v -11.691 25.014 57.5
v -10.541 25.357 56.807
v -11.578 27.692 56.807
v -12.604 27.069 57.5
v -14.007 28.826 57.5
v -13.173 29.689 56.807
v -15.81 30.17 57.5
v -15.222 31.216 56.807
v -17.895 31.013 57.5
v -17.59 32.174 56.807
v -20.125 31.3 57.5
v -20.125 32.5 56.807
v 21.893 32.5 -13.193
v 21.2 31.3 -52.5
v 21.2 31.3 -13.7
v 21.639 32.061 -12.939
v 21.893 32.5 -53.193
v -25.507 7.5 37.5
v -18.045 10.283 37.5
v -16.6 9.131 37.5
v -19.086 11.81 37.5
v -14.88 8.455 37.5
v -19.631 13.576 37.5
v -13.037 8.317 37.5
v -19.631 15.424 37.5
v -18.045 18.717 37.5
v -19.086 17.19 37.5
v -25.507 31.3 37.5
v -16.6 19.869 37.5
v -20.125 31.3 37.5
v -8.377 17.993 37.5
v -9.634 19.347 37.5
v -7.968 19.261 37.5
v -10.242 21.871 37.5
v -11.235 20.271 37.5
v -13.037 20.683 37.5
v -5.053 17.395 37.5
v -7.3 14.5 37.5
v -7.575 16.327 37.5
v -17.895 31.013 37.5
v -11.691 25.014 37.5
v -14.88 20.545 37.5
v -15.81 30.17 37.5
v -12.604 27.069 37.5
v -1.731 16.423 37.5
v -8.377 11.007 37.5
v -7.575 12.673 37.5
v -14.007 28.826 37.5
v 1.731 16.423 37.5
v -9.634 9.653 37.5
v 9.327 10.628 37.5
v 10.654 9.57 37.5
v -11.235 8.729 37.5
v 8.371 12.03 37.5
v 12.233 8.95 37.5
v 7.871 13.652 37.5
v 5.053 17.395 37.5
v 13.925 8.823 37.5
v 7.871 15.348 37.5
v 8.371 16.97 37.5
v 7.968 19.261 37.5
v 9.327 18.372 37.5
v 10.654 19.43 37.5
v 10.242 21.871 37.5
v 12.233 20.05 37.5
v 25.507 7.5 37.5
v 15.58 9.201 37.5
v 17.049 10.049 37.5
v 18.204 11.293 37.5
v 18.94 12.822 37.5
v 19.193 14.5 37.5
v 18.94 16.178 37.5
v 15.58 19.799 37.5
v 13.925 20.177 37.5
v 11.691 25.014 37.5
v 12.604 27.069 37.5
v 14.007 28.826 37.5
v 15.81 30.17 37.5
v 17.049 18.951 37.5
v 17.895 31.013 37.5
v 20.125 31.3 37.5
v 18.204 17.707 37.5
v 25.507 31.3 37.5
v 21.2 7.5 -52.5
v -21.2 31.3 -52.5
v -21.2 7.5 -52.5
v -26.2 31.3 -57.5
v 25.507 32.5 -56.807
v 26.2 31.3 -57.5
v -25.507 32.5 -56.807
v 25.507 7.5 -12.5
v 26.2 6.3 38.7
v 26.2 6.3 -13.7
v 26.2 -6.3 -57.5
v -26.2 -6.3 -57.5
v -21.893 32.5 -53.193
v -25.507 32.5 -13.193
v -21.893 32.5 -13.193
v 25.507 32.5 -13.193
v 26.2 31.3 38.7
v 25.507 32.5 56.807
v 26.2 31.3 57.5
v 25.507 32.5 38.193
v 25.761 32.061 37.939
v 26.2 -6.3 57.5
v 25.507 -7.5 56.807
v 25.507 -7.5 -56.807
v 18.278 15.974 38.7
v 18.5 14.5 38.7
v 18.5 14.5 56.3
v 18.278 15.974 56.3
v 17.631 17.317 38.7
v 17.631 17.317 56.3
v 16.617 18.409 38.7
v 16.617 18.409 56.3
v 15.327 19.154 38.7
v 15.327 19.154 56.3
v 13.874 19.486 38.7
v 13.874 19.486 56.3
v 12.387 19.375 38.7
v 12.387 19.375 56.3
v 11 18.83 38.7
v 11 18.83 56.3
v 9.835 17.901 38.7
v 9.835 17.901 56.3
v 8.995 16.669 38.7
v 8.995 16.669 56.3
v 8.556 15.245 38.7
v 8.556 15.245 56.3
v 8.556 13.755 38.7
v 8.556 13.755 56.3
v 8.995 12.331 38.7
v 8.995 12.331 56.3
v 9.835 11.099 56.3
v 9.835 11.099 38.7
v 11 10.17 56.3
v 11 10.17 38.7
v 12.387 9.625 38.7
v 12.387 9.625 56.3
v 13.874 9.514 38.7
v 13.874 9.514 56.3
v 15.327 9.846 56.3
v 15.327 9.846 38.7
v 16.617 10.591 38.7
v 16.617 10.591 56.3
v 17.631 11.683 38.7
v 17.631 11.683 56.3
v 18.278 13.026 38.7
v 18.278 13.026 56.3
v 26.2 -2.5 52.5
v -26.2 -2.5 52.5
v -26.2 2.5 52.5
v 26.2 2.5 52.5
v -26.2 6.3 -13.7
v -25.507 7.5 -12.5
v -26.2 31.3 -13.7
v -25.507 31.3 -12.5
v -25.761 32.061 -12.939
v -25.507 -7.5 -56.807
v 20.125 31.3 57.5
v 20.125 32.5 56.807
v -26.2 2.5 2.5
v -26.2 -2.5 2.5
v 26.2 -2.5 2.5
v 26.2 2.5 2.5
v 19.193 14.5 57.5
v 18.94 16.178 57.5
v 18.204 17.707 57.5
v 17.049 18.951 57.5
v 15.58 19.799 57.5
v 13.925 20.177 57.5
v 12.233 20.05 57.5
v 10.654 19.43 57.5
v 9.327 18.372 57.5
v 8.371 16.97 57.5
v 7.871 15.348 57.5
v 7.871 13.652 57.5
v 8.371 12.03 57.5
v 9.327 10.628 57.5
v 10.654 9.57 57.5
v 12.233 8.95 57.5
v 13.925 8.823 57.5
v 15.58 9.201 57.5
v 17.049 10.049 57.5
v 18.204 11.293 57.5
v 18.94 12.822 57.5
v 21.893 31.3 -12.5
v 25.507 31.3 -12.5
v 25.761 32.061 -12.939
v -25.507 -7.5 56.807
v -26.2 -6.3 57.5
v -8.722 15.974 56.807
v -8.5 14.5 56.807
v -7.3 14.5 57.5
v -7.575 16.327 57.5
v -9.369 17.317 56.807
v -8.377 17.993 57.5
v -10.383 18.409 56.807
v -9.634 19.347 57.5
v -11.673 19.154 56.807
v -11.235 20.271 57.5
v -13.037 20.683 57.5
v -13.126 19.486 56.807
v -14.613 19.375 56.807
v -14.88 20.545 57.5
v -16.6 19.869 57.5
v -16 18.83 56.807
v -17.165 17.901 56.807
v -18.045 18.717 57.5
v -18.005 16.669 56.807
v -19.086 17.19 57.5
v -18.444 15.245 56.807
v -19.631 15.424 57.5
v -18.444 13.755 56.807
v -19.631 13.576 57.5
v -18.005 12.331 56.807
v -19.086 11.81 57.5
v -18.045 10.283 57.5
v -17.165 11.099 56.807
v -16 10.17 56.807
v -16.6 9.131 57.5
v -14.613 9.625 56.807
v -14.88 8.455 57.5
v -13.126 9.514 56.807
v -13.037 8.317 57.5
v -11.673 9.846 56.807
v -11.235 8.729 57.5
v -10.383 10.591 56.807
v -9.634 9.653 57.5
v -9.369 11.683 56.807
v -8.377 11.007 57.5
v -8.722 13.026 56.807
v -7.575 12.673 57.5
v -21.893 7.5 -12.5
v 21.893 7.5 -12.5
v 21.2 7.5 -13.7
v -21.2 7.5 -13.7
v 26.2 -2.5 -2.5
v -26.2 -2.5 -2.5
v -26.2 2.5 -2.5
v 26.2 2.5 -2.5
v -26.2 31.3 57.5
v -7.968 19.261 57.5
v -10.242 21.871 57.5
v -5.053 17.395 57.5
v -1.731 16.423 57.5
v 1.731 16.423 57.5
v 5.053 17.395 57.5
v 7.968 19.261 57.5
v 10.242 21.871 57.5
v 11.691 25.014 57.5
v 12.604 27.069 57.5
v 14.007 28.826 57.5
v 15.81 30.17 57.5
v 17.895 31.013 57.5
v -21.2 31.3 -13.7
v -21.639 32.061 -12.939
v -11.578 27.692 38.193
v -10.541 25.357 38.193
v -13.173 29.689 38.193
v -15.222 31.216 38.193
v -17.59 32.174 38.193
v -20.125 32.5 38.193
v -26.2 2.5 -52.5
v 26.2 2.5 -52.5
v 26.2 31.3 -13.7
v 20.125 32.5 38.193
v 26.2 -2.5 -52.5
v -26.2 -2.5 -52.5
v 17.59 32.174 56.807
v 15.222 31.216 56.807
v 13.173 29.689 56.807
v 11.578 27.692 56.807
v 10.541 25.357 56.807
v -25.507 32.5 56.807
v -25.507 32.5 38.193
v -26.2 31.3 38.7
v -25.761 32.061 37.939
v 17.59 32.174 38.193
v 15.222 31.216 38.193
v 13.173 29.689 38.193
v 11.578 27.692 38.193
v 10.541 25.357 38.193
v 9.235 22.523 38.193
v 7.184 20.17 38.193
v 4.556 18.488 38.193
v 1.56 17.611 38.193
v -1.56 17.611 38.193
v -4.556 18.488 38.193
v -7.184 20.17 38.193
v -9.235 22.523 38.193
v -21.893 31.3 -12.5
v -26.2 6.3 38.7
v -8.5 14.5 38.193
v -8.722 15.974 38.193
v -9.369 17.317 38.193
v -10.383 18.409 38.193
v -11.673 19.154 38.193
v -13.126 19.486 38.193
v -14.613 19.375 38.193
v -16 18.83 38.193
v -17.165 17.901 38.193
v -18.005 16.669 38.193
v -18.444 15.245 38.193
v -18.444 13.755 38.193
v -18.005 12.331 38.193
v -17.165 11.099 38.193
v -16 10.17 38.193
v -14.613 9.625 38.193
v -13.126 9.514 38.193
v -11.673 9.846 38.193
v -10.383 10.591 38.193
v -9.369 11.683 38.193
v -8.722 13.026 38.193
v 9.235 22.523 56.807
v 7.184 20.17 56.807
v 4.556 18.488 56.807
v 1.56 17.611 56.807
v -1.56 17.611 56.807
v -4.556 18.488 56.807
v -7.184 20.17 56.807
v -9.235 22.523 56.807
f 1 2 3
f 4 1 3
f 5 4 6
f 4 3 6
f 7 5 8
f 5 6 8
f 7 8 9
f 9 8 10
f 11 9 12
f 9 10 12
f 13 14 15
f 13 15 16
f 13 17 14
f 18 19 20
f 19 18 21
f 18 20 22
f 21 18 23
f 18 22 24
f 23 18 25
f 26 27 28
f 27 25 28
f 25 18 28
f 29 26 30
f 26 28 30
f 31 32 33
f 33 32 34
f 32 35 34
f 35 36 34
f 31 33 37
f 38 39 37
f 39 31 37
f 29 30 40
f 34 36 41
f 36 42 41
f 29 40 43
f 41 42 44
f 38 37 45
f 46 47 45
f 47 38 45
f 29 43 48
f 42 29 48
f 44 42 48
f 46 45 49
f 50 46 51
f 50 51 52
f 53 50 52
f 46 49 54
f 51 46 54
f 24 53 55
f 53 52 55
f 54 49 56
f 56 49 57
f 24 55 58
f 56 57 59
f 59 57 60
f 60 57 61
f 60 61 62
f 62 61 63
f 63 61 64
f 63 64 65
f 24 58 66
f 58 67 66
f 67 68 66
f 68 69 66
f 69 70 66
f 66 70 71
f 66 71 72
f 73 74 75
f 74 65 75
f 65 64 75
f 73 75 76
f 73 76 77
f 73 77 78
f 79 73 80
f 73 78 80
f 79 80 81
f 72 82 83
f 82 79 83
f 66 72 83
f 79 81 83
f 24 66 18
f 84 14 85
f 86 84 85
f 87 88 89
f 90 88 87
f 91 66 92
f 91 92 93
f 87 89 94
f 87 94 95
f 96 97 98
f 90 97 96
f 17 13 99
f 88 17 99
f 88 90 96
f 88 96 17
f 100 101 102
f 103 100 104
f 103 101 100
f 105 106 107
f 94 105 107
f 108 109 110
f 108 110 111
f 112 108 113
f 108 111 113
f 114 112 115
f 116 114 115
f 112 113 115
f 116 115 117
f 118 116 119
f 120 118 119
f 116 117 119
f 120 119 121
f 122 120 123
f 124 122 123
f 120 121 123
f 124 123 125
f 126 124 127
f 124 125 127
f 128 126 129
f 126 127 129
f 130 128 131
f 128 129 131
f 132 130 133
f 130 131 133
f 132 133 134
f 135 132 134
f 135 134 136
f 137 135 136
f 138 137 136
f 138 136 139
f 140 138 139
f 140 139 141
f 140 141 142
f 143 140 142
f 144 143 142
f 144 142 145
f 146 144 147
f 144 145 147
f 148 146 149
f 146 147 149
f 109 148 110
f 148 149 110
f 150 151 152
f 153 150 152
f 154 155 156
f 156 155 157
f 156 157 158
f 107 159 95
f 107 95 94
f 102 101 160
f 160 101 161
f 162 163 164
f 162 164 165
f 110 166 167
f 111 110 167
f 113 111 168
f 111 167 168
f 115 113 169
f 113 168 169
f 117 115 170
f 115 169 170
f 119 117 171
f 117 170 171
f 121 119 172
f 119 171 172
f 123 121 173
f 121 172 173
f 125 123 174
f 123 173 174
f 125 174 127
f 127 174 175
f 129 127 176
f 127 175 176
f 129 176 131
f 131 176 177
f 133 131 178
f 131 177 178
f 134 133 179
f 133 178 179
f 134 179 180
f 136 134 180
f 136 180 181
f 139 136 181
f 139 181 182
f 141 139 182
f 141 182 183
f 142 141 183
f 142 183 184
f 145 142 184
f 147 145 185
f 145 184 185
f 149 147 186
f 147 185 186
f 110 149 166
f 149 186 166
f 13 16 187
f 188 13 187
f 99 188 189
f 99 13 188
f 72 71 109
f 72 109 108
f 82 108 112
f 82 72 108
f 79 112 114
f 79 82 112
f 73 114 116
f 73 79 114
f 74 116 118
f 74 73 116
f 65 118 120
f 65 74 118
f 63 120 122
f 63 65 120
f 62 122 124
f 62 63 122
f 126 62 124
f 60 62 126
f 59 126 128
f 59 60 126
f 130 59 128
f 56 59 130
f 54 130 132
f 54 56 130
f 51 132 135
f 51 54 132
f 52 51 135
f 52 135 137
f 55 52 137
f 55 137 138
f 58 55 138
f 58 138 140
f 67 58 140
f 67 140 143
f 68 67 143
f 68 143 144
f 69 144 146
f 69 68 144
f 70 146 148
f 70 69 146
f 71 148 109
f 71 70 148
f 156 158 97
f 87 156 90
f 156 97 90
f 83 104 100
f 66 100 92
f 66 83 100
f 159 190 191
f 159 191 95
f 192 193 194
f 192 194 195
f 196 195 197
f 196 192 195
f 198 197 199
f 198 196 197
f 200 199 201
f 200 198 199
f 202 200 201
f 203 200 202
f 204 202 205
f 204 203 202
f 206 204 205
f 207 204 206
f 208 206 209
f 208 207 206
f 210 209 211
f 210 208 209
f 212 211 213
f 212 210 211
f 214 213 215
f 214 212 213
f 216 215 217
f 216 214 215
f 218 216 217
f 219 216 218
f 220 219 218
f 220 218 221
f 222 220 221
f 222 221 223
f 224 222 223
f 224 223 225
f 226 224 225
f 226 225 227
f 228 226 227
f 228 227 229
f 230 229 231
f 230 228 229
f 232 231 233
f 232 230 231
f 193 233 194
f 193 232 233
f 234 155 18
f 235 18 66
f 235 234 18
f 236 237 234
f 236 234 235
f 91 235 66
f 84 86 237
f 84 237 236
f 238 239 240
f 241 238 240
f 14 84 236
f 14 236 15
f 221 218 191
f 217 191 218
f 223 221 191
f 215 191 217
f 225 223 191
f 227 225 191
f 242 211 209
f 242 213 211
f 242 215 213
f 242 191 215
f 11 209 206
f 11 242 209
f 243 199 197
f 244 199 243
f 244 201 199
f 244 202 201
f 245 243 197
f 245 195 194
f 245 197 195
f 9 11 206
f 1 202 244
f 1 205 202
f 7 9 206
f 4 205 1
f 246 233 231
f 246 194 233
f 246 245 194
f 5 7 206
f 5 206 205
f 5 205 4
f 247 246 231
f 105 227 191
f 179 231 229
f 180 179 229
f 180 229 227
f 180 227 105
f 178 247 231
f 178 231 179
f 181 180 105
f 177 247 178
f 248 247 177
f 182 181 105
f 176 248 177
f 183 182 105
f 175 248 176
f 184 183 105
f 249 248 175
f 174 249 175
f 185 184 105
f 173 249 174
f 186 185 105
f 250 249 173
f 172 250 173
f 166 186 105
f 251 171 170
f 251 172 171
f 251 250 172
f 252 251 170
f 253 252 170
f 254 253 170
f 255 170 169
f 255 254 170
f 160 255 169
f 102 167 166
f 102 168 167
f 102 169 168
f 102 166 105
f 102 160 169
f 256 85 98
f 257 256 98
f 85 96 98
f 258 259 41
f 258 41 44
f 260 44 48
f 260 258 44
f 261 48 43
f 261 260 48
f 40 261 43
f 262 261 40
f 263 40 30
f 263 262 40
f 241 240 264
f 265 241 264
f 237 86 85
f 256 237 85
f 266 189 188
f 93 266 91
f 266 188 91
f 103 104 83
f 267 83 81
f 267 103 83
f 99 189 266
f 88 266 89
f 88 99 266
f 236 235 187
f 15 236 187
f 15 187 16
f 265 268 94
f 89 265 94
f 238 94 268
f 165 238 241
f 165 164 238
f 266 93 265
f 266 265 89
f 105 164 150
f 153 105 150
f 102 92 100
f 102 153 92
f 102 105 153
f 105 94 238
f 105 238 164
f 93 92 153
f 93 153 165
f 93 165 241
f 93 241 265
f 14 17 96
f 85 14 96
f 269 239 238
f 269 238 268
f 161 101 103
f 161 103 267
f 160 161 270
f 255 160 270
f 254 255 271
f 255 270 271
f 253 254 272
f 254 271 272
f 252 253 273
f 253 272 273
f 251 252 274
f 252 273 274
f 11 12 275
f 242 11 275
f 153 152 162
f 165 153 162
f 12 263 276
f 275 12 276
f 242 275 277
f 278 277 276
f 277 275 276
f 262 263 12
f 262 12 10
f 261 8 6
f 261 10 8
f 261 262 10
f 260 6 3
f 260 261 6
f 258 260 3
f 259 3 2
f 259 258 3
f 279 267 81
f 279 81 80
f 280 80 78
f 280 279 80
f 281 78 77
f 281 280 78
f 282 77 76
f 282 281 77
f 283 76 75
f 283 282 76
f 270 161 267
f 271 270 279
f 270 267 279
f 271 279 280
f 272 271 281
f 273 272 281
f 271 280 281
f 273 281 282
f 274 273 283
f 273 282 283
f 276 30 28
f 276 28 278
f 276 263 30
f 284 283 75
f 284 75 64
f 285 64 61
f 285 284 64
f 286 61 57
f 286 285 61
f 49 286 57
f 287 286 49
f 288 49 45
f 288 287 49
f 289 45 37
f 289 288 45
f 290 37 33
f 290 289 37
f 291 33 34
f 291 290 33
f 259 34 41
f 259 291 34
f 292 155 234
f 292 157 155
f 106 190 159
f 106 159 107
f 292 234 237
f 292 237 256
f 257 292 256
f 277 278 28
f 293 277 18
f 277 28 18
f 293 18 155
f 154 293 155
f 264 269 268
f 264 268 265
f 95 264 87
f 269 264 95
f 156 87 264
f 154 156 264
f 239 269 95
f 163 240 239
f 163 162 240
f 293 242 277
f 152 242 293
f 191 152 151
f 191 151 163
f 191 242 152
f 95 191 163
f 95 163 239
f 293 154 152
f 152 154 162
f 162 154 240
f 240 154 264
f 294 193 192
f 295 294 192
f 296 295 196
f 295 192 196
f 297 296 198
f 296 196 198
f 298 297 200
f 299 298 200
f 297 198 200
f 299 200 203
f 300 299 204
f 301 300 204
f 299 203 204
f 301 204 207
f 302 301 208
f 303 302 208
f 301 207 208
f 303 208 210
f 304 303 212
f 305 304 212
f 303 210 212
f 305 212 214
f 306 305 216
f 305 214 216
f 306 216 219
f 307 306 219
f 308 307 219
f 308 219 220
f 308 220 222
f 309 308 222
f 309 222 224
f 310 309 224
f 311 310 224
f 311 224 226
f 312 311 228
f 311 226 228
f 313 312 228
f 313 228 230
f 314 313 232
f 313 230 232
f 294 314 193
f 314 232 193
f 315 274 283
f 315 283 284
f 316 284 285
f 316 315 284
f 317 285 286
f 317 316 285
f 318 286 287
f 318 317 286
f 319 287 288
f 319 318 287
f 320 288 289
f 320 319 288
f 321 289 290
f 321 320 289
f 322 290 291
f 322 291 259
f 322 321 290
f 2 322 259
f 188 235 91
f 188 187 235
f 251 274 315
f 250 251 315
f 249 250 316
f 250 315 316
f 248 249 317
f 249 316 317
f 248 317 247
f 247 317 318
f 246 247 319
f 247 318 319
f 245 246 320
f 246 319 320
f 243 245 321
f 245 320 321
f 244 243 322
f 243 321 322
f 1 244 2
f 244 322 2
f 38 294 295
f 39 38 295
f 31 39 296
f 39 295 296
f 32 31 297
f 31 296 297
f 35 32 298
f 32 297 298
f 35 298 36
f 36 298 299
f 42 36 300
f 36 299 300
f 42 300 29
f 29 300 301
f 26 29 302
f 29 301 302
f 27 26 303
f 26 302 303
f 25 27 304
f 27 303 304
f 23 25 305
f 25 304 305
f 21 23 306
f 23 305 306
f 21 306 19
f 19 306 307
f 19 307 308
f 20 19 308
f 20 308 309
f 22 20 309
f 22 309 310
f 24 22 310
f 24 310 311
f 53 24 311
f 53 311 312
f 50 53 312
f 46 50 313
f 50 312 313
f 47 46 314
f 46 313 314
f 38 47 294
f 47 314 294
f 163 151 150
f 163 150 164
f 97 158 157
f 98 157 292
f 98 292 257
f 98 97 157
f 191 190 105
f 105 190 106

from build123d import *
from OCP.BRepFilletAPI import BRepFilletAPI_MakeChamfer

# Parameters (mm, degrees)
SKETCH_1_W               = 52.4
SKETCH_1_H               = 115
EXTRUDE_1_DEPTH          = 7.5
CUT_EXTRUDE_1_DEPTH      = 64.631281615
CUT_EXTRUDE_1_DEPTH_BACK = 64.631281615
SKETCH_2_W               = 50
SKETCH_2_H               = 5
SKETCH_3_W               = 52.4
SKETCH_3_H               = 25
EXTRUDE_2_DEPTH          = 5
SKETCH_4_W               = 5
SKETCH_4_H               = 25
EXTRUDE_3_DEPTH          = 40
EXTRUDE_4_DEPTH          = 20
FILLET_1_R               = 10
SKETCH_7_R               = 5
CUT_EXTRUDE_2_DEPTH      = 20
CHAMFER_1_SIZE           = 1.2
CHAMFER_1_SIZE2          = 0.692820323
CHAMFER_2_SIZE           = 1.2
CHAMFER_2_SIZE2          = 0.692820323
CHAMFER_3_SIZE           = 1.2
CHAMFER_3_SIZE2          = 0.692820323
CHAMFER_4_SIZE           = 1.2
CHAMFER_4_SIZE2          = 0.692820323


with BuildPart() as part:
    # 스케치1 → 보스-돌출1 (new, symmetric)
    with BuildSketch(Plane(origin=(0, 0, 0), x_dir=(1, 0, 0), z_dir=(0, 1, 0))):
        Rectangle(SKETCH_1_W, SKETCH_1_H)
    extrude(amount=EXTRUDE_1_DEPTH, both=True)

    # 스케치2 → 컷-돌출1 (cut, two sides: drawn at the far end of the back side and taken through both)
    with BuildSketch(Plane(origin=(0, 0, 0), x_dir=(0, 0, -1), z_dir=(1, 0, 0)).offset(-CUT_EXTRUDE_1_DEPTH_BACK)):
        with Locations((27.5, 0)):
            Rectangle(SKETCH_2_W, SKETCH_2_H)
        with Locations((-27.5, 0)):
            Rectangle(SKETCH_2_W, SKETCH_2_H)
    extrude(amount=CUT_EXTRUDE_1_DEPTH + CUT_EXTRUDE_1_DEPTH_BACK, mode=Mode.SUBTRACT)

    # 스케치3 → 보스-돌출2 (add)
    with BuildSketch(Plane(origin=(0, 0, -57.5), x_dir=(-1, 0, 0), z_dir=(0, 0, -1))):
        with Locations((0, 20)):
            Rectangle(SKETCH_3_W, SKETCH_3_H)
    extrude(amount=-EXTRUDE_2_DEPTH)

    # 스케치4 → 보스-돌출3 (add)
    with BuildSketch(Plane.XY.offset(-52.5)):
        with Locations((-23.7, 20)):
            Rectangle(SKETCH_4_W, SKETCH_4_H)
        with Locations((23.7, 20)):
            Rectangle(SKETCH_4_W, SKETCH_4_H)
    extrude(amount=EXTRUDE_3_DEPTH)

    # 스케치5 → 보스-돌출4 (add)
    with BuildSketch(Plane.XY.offset(57.5)):
        with BuildLine():
            Line((-10.246950766, 32.5), (-26.2, 32.5))
            Line((-26.2, 32.5), (-26.2, 7.5))
            Line((-26.2, 7.5), (26.2, 7.5))
            Line((26.2, 7.5), (26.2, 32.5))
            Line((26.2, 32.5), (10.246950766, 32.5))
            ThreePointArc((10.246950766, 32.5), (0, 17.5), (-10.246950766, 32.5))
        make_face()
    extrude(amount=-EXTRUDE_4_DEPTH)

    # 필렛1
    fillet_1_edges = [part.edges().sort_by_distance(p)[0] for p in [
        (-10.246950766, 32.5, 47.5),
        (10.246950766, 32.5, 47.5),
    ]]
    fillet(fillet_1_edges, radius=FILLET_1_R)

    # 스케치7 → 컷-돌출2 (cut)
    with BuildSketch(Plane.XY.offset(57.5)):
        with Locations((-13.5, 14.5)):
            Circle(SKETCH_7_R)
        with Locations((13.5, 14.5)):
            Circle(SKETCH_7_R)
    extrude(amount=-CUT_EXTRUDE_2_DEPTH, mode=Mode.SUBTRACT)

    # 모따기1: one chamfer whose edges measure the first distance from different faces: ONE call of the kernel's chamfer builder (chamfer() names one face for all edges)
    chamfer_1_edges_1 = [part.edges().sort_by_distance(p)[0] for p in [
        (-23.162305899, 32.5, 57.5),
        (-14.148468751, 30.517837257, 57.5),
        (14.148468751, 30.517837257, 57.5),
        (0, -7.5, 57.5),
        (23.162305899, 32.5, 57.5),
        (0, 17.5, 57.5),
    ]]
    chamfer_1_side_1 = [part.faces().sort_by_distance(p)[0] for p in [
        (0, 9.670777652, 57.5),
    ]]
    chamfer_1_edges_2 = [part.edges().sort_by_distance(p)[0] for p in [
        (0, 17.5, 37.5),
        (-23.162305899, 32.5, 37.5),
        (-14.148468751, 30.517837257, 37.5),
        (14.148468751, 30.517837257, 37.5),
        (23.162305899, 32.5, 37.5),
    ]]
    chamfer_1_side_2 = [part.faces().sort_by_distance(p)[0] for p in [
        (-23.162305899, 31.919417534, 37.5),
    ]]
    chamfer_1_edges_3 = [part.edges().sort_by_distance(p)[0] for p in [
        (26.2, 32.5, -35),
        (26.2, -7.5, 0),
        (26.2, 32.5, 47.5),
    ]]
    chamfer_1_side_3 = [part.faces().sort_by_distance(p)[0] for p in [
        (26.2, 12.5, 56.282420434),
    ]]
    chamfer_1_edges_4 = [part.edges().sort_by_distance(p)[0] for p in [
        (-26.2, 32.5, -35),
        (-26.2, -7.5, 0),
        (-26.2, 32.5, 47.5),
    ]]
    chamfer_1_side_4 = [part.faces().sort_by_distance(p)[0] for p in [
        (-26.2, -6.282420434, 0),
    ]]
    chamfer_1_edges_5 = [part.edges().sort_by_distance(p)[0] for p in [
        (0, 32.5, -57.5),
        (0, -7.5, -57.5),
    ]]
    chamfer_1_side_5 = [part.faces().sort_by_distance(p)[0] for p in [
        (0, 12.5, -57.5),
    ]]
    chamfer_1_edges_6 = [part.edges().sort_by_distance(p)[0] for p in [
        (0, 32.5, -52.5),
    ]]
    chamfer_1_side_6 = [part.faces().sort_by_distance(p)[0] for p in [
        (0, 20, -52.5),
    ]]
    chamfer_1_edges_7 = [part.edges().sort_by_distance(p)[0] for p in [
        (-21.2, 32.5, -32.5),
    ]]
    chamfer_1_side_7 = [part.faces().sort_by_distance(p)[0] for p in [
        (-21.2, 20, -32.5),
    ]]
    chamfer_1_edges_8 = [part.edges().sort_by_distance(p)[0] for p in [
        (-23.7, 32.5, -12.5),
    ]]
    chamfer_1_side_8 = [part.faces().sort_by_distance(p)[0] for p in [
        (-23.7, 20, -12.5),
    ]]
    chamfer_1_edges_9 = [part.edges().sort_by_distance(p)[0] for p in [
        (21.2, 32.5, -32.5),
    ]]
    chamfer_1_side_9 = [part.faces().sort_by_distance(p)[0] for p in [
        (21.2, 20, -32.5),
    ]]
    chamfer_1_edges_10 = [part.edges().sort_by_distance(p)[0] for p in [
        (23.7, 32.5, -12.5),
    ]]
    chamfer_1_side_10 = [part.faces().sort_by_distance(p)[0] for p in [
        (23.7, 20, -12.5),
    ]]
    chamfer_1 = BRepFilletAPI_MakeChamfer(part.part.solid().wrapped)
    for e in chamfer_1_edges_1:
        chamfer_1.Add(CHAMFER_1_SIZE, CHAMFER_1_SIZE2, e.wrapped, chamfer_1_side_1[0].wrapped)  # the first distance lies on this face
    for e in chamfer_1_edges_2:
        chamfer_1.Add(CHAMFER_1_SIZE, CHAMFER_1_SIZE2, e.wrapped, chamfer_1_side_2[0].wrapped)  # the first distance lies on this face
    for e in chamfer_1_edges_3:
        chamfer_1.Add(CHAMFER_1_SIZE, CHAMFER_1_SIZE2, e.wrapped, chamfer_1_side_3[0].wrapped)  # the first distance lies on this face
    for e in chamfer_1_edges_4:
        chamfer_1.Add(CHAMFER_1_SIZE, CHAMFER_1_SIZE2, e.wrapped, chamfer_1_side_4[0].wrapped)  # the first distance lies on this face
    for e in chamfer_1_edges_5:
        chamfer_1.Add(CHAMFER_1_SIZE, CHAMFER_1_SIZE2, e.wrapped, chamfer_1_side_5[0].wrapped)  # the first distance lies on this face
    for e in chamfer_1_edges_6:
        chamfer_1.Add(CHAMFER_1_SIZE, CHAMFER_1_SIZE2, e.wrapped, chamfer_1_side_6[0].wrapped)  # the first distance lies on this face
    for e in chamfer_1_edges_7:
        chamfer_1.Add(CHAMFER_1_SIZE, CHAMFER_1_SIZE2, e.wrapped, chamfer_1_side_7[0].wrapped)  # the first distance lies on this face
    for e in chamfer_1_edges_8:
        chamfer_1.Add(CHAMFER_1_SIZE, CHAMFER_1_SIZE2, e.wrapped, chamfer_1_side_8[0].wrapped)  # the first distance lies on this face
    for e in chamfer_1_edges_9:
        chamfer_1.Add(CHAMFER_1_SIZE, CHAMFER_1_SIZE2, e.wrapped, chamfer_1_side_9[0].wrapped)  # the first distance lies on this face
    for e in chamfer_1_edges_10:
        chamfer_1.Add(CHAMFER_1_SIZE, CHAMFER_1_SIZE2, e.wrapped, chamfer_1_side_10[0].wrapped)  # the first distance lies on this face
    add(Compound.cast(chamfer_1.Shape()), mode=Mode.REPLACE)

    # 모따기2: one chamfer whose edges measure the first distance from different faces: ONE call of the kernel's chamfer builder (chamfer() names one face for all edges)
    chamfer_2_edges_1 = [part.edges().sort_by_distance(p)[0] for p in [
        (-18.5, 14.5, 37.5),
    ]]
    chamfer_2_side_1 = [part.faces().sort_by_distance(p)[0] for p in [
        (-25.624482841, 19.4, 37.5),
    ]]
    chamfer_2_edges_2 = [part.edges().sort_by_distance(p)[0] for p in [
        (-18.5, 14.5, 57.5),
    ]]
    chamfer_2_side_2 = [part.faces().sort_by_distance(p)[0] for p in [
        (0, 9.52416619, 57.5),
    ]]
    chamfer_2_edges_3 = [part.edges().sort_by_distance(p)[0] for p in [
        (8.5, 14.5, 37.5),
        (8.5, 14.5, 57.5),
    ]]
    chamfer_2_side_3 = [part.faces().sort_by_distance(p)[0] for p in [
        (8.5, 14.5, 47.5),
    ]]
    chamfer_2 = BRepFilletAPI_MakeChamfer(part.part.solid().wrapped)
    for e in chamfer_2_edges_1:
        chamfer_2.Add(CHAMFER_2_SIZE, CHAMFER_2_SIZE2, e.wrapped, chamfer_2_side_1[0].wrapped)  # the first distance lies on this face
    for e in chamfer_2_edges_2:
        chamfer_2.Add(CHAMFER_2_SIZE, CHAMFER_2_SIZE2, e.wrapped, chamfer_2_side_2[0].wrapped)  # the first distance lies on this face
    for e in chamfer_2_edges_3:
        chamfer_2.Add(CHAMFER_2_SIZE, CHAMFER_2_SIZE2, e.wrapped, chamfer_2_side_3[0].wrapped)  # the first distance lies on this face
    add(Compound.cast(chamfer_2.Shape()), mode=Mode.REPLACE)

    # 모따기3: one chamfer whose edges measure the first distance from different faces: ONE call of the kernel's chamfer builder (chamfer() names one face for all edges)
    chamfer_3_edges_1 = [part.edges().sort_by_distance(p)[0] for p in [
        (-26.2, 7.5, 12.5),
    ]]
    chamfer_3_side_1 = [part.faces().sort_by_distance(p)[0] for p in [
        (-26.2, 12.5, 56.290092566),
    ]]
    chamfer_3_edges_2 = [part.edges().sort_by_distance(p)[0] for p in [
        (26.2, 7.5, 12.5),
    ]]
    chamfer_3_side_2 = [part.faces().sort_by_distance(p)[0] for p in [
        (26.2, 12.5, 56.290092566),
    ]]
    chamfer_3 = BRepFilletAPI_MakeChamfer(part.part.solid().wrapped)
    for e in chamfer_3_edges_1:
        chamfer_3.Add(CHAMFER_3_SIZE, CHAMFER_3_SIZE2, e.wrapped, chamfer_3_side_1[0].wrapped)  # the first distance lies on this face
    for e in chamfer_3_edges_2:
        chamfer_3.Add(CHAMFER_3_SIZE, CHAMFER_3_SIZE2, e.wrapped, chamfer_3_side_2[0].wrapped)  # the first distance lies on this face
    add(Compound.cast(chamfer_3.Shape()), mode=Mode.REPLACE)

    # 모따기4: one chamfer whose edges measure the first distance from different faces: ONE call of the kernel's chamfer builder (chamfer() names one face for all edges)
    chamfer_4_edges_1 = [part.edges().sort_by_distance(p)[0] for p in [
        (26.2, 18.8, 37.5),
        (26.2, 18.8, -12.5),
    ]]
    chamfer_4_side_1 = [part.faces().sort_by_distance(p)[0] for p in [
        (26.2, 18.8, 38.709907434),
    ]]
    chamfer_4_edges_2 = [part.edges().sort_by_distance(p)[0] for p in [
        (-26.2, 18.8, 37.5),
        (-26.2, 18.8, -12.5),
    ]]
    chamfer_4_side_2 = [part.faces().sort_by_distance(p)[0] for p in [
        (-26.2, 18.8, -13.709907434),
    ]]
    chamfer_4_edges_3 = [part.edges().sort_by_distance(p)[0] for p in [
        (21.2, 19.4, -12.5),
    ]]
    chamfer_4_side_3 = [part.faces().sort_by_distance(p)[0] for p in [
        (21.2, 19.4, -32.5),
    ]]
    chamfer_4_edges_4 = [part.edges().sort_by_distance(p)[0] for p in [
        (-21.2, 19.4, -12.5),
    ]]
    chamfer_4_side_4 = [part.faces().sort_by_distance(p)[0] for p in [
        (-21.2, 19.4, -32.5),
    ]]
    chamfer_4 = BRepFilletAPI_MakeChamfer(part.part.solid().wrapped)
    for e in chamfer_4_edges_1:
        chamfer_4.Add(CHAMFER_4_SIZE, CHAMFER_4_SIZE2, e.wrapped, chamfer_4_side_1[0].wrapped)  # the first distance lies on this face
    for e in chamfer_4_edges_2:
        chamfer_4.Add(CHAMFER_4_SIZE, CHAMFER_4_SIZE2, e.wrapped, chamfer_4_side_2[0].wrapped)  # the first distance lies on this face
    for e in chamfer_4_edges_3:
        chamfer_4.Add(CHAMFER_4_SIZE, CHAMFER_4_SIZE2, e.wrapped, chamfer_4_side_3[0].wrapped)  # the first distance lies on this face
    for e in chamfer_4_edges_4:
        chamfer_4.Add(CHAMFER_4_SIZE, CHAMFER_4_SIZE2, e.wrapped, chamfer_4_side_4[0].wrapped)  # the first distance lies on this face
    add(Compound.cast(chamfer_4.Shape()), mode=Mode.REPLACE)


solid = part.part
